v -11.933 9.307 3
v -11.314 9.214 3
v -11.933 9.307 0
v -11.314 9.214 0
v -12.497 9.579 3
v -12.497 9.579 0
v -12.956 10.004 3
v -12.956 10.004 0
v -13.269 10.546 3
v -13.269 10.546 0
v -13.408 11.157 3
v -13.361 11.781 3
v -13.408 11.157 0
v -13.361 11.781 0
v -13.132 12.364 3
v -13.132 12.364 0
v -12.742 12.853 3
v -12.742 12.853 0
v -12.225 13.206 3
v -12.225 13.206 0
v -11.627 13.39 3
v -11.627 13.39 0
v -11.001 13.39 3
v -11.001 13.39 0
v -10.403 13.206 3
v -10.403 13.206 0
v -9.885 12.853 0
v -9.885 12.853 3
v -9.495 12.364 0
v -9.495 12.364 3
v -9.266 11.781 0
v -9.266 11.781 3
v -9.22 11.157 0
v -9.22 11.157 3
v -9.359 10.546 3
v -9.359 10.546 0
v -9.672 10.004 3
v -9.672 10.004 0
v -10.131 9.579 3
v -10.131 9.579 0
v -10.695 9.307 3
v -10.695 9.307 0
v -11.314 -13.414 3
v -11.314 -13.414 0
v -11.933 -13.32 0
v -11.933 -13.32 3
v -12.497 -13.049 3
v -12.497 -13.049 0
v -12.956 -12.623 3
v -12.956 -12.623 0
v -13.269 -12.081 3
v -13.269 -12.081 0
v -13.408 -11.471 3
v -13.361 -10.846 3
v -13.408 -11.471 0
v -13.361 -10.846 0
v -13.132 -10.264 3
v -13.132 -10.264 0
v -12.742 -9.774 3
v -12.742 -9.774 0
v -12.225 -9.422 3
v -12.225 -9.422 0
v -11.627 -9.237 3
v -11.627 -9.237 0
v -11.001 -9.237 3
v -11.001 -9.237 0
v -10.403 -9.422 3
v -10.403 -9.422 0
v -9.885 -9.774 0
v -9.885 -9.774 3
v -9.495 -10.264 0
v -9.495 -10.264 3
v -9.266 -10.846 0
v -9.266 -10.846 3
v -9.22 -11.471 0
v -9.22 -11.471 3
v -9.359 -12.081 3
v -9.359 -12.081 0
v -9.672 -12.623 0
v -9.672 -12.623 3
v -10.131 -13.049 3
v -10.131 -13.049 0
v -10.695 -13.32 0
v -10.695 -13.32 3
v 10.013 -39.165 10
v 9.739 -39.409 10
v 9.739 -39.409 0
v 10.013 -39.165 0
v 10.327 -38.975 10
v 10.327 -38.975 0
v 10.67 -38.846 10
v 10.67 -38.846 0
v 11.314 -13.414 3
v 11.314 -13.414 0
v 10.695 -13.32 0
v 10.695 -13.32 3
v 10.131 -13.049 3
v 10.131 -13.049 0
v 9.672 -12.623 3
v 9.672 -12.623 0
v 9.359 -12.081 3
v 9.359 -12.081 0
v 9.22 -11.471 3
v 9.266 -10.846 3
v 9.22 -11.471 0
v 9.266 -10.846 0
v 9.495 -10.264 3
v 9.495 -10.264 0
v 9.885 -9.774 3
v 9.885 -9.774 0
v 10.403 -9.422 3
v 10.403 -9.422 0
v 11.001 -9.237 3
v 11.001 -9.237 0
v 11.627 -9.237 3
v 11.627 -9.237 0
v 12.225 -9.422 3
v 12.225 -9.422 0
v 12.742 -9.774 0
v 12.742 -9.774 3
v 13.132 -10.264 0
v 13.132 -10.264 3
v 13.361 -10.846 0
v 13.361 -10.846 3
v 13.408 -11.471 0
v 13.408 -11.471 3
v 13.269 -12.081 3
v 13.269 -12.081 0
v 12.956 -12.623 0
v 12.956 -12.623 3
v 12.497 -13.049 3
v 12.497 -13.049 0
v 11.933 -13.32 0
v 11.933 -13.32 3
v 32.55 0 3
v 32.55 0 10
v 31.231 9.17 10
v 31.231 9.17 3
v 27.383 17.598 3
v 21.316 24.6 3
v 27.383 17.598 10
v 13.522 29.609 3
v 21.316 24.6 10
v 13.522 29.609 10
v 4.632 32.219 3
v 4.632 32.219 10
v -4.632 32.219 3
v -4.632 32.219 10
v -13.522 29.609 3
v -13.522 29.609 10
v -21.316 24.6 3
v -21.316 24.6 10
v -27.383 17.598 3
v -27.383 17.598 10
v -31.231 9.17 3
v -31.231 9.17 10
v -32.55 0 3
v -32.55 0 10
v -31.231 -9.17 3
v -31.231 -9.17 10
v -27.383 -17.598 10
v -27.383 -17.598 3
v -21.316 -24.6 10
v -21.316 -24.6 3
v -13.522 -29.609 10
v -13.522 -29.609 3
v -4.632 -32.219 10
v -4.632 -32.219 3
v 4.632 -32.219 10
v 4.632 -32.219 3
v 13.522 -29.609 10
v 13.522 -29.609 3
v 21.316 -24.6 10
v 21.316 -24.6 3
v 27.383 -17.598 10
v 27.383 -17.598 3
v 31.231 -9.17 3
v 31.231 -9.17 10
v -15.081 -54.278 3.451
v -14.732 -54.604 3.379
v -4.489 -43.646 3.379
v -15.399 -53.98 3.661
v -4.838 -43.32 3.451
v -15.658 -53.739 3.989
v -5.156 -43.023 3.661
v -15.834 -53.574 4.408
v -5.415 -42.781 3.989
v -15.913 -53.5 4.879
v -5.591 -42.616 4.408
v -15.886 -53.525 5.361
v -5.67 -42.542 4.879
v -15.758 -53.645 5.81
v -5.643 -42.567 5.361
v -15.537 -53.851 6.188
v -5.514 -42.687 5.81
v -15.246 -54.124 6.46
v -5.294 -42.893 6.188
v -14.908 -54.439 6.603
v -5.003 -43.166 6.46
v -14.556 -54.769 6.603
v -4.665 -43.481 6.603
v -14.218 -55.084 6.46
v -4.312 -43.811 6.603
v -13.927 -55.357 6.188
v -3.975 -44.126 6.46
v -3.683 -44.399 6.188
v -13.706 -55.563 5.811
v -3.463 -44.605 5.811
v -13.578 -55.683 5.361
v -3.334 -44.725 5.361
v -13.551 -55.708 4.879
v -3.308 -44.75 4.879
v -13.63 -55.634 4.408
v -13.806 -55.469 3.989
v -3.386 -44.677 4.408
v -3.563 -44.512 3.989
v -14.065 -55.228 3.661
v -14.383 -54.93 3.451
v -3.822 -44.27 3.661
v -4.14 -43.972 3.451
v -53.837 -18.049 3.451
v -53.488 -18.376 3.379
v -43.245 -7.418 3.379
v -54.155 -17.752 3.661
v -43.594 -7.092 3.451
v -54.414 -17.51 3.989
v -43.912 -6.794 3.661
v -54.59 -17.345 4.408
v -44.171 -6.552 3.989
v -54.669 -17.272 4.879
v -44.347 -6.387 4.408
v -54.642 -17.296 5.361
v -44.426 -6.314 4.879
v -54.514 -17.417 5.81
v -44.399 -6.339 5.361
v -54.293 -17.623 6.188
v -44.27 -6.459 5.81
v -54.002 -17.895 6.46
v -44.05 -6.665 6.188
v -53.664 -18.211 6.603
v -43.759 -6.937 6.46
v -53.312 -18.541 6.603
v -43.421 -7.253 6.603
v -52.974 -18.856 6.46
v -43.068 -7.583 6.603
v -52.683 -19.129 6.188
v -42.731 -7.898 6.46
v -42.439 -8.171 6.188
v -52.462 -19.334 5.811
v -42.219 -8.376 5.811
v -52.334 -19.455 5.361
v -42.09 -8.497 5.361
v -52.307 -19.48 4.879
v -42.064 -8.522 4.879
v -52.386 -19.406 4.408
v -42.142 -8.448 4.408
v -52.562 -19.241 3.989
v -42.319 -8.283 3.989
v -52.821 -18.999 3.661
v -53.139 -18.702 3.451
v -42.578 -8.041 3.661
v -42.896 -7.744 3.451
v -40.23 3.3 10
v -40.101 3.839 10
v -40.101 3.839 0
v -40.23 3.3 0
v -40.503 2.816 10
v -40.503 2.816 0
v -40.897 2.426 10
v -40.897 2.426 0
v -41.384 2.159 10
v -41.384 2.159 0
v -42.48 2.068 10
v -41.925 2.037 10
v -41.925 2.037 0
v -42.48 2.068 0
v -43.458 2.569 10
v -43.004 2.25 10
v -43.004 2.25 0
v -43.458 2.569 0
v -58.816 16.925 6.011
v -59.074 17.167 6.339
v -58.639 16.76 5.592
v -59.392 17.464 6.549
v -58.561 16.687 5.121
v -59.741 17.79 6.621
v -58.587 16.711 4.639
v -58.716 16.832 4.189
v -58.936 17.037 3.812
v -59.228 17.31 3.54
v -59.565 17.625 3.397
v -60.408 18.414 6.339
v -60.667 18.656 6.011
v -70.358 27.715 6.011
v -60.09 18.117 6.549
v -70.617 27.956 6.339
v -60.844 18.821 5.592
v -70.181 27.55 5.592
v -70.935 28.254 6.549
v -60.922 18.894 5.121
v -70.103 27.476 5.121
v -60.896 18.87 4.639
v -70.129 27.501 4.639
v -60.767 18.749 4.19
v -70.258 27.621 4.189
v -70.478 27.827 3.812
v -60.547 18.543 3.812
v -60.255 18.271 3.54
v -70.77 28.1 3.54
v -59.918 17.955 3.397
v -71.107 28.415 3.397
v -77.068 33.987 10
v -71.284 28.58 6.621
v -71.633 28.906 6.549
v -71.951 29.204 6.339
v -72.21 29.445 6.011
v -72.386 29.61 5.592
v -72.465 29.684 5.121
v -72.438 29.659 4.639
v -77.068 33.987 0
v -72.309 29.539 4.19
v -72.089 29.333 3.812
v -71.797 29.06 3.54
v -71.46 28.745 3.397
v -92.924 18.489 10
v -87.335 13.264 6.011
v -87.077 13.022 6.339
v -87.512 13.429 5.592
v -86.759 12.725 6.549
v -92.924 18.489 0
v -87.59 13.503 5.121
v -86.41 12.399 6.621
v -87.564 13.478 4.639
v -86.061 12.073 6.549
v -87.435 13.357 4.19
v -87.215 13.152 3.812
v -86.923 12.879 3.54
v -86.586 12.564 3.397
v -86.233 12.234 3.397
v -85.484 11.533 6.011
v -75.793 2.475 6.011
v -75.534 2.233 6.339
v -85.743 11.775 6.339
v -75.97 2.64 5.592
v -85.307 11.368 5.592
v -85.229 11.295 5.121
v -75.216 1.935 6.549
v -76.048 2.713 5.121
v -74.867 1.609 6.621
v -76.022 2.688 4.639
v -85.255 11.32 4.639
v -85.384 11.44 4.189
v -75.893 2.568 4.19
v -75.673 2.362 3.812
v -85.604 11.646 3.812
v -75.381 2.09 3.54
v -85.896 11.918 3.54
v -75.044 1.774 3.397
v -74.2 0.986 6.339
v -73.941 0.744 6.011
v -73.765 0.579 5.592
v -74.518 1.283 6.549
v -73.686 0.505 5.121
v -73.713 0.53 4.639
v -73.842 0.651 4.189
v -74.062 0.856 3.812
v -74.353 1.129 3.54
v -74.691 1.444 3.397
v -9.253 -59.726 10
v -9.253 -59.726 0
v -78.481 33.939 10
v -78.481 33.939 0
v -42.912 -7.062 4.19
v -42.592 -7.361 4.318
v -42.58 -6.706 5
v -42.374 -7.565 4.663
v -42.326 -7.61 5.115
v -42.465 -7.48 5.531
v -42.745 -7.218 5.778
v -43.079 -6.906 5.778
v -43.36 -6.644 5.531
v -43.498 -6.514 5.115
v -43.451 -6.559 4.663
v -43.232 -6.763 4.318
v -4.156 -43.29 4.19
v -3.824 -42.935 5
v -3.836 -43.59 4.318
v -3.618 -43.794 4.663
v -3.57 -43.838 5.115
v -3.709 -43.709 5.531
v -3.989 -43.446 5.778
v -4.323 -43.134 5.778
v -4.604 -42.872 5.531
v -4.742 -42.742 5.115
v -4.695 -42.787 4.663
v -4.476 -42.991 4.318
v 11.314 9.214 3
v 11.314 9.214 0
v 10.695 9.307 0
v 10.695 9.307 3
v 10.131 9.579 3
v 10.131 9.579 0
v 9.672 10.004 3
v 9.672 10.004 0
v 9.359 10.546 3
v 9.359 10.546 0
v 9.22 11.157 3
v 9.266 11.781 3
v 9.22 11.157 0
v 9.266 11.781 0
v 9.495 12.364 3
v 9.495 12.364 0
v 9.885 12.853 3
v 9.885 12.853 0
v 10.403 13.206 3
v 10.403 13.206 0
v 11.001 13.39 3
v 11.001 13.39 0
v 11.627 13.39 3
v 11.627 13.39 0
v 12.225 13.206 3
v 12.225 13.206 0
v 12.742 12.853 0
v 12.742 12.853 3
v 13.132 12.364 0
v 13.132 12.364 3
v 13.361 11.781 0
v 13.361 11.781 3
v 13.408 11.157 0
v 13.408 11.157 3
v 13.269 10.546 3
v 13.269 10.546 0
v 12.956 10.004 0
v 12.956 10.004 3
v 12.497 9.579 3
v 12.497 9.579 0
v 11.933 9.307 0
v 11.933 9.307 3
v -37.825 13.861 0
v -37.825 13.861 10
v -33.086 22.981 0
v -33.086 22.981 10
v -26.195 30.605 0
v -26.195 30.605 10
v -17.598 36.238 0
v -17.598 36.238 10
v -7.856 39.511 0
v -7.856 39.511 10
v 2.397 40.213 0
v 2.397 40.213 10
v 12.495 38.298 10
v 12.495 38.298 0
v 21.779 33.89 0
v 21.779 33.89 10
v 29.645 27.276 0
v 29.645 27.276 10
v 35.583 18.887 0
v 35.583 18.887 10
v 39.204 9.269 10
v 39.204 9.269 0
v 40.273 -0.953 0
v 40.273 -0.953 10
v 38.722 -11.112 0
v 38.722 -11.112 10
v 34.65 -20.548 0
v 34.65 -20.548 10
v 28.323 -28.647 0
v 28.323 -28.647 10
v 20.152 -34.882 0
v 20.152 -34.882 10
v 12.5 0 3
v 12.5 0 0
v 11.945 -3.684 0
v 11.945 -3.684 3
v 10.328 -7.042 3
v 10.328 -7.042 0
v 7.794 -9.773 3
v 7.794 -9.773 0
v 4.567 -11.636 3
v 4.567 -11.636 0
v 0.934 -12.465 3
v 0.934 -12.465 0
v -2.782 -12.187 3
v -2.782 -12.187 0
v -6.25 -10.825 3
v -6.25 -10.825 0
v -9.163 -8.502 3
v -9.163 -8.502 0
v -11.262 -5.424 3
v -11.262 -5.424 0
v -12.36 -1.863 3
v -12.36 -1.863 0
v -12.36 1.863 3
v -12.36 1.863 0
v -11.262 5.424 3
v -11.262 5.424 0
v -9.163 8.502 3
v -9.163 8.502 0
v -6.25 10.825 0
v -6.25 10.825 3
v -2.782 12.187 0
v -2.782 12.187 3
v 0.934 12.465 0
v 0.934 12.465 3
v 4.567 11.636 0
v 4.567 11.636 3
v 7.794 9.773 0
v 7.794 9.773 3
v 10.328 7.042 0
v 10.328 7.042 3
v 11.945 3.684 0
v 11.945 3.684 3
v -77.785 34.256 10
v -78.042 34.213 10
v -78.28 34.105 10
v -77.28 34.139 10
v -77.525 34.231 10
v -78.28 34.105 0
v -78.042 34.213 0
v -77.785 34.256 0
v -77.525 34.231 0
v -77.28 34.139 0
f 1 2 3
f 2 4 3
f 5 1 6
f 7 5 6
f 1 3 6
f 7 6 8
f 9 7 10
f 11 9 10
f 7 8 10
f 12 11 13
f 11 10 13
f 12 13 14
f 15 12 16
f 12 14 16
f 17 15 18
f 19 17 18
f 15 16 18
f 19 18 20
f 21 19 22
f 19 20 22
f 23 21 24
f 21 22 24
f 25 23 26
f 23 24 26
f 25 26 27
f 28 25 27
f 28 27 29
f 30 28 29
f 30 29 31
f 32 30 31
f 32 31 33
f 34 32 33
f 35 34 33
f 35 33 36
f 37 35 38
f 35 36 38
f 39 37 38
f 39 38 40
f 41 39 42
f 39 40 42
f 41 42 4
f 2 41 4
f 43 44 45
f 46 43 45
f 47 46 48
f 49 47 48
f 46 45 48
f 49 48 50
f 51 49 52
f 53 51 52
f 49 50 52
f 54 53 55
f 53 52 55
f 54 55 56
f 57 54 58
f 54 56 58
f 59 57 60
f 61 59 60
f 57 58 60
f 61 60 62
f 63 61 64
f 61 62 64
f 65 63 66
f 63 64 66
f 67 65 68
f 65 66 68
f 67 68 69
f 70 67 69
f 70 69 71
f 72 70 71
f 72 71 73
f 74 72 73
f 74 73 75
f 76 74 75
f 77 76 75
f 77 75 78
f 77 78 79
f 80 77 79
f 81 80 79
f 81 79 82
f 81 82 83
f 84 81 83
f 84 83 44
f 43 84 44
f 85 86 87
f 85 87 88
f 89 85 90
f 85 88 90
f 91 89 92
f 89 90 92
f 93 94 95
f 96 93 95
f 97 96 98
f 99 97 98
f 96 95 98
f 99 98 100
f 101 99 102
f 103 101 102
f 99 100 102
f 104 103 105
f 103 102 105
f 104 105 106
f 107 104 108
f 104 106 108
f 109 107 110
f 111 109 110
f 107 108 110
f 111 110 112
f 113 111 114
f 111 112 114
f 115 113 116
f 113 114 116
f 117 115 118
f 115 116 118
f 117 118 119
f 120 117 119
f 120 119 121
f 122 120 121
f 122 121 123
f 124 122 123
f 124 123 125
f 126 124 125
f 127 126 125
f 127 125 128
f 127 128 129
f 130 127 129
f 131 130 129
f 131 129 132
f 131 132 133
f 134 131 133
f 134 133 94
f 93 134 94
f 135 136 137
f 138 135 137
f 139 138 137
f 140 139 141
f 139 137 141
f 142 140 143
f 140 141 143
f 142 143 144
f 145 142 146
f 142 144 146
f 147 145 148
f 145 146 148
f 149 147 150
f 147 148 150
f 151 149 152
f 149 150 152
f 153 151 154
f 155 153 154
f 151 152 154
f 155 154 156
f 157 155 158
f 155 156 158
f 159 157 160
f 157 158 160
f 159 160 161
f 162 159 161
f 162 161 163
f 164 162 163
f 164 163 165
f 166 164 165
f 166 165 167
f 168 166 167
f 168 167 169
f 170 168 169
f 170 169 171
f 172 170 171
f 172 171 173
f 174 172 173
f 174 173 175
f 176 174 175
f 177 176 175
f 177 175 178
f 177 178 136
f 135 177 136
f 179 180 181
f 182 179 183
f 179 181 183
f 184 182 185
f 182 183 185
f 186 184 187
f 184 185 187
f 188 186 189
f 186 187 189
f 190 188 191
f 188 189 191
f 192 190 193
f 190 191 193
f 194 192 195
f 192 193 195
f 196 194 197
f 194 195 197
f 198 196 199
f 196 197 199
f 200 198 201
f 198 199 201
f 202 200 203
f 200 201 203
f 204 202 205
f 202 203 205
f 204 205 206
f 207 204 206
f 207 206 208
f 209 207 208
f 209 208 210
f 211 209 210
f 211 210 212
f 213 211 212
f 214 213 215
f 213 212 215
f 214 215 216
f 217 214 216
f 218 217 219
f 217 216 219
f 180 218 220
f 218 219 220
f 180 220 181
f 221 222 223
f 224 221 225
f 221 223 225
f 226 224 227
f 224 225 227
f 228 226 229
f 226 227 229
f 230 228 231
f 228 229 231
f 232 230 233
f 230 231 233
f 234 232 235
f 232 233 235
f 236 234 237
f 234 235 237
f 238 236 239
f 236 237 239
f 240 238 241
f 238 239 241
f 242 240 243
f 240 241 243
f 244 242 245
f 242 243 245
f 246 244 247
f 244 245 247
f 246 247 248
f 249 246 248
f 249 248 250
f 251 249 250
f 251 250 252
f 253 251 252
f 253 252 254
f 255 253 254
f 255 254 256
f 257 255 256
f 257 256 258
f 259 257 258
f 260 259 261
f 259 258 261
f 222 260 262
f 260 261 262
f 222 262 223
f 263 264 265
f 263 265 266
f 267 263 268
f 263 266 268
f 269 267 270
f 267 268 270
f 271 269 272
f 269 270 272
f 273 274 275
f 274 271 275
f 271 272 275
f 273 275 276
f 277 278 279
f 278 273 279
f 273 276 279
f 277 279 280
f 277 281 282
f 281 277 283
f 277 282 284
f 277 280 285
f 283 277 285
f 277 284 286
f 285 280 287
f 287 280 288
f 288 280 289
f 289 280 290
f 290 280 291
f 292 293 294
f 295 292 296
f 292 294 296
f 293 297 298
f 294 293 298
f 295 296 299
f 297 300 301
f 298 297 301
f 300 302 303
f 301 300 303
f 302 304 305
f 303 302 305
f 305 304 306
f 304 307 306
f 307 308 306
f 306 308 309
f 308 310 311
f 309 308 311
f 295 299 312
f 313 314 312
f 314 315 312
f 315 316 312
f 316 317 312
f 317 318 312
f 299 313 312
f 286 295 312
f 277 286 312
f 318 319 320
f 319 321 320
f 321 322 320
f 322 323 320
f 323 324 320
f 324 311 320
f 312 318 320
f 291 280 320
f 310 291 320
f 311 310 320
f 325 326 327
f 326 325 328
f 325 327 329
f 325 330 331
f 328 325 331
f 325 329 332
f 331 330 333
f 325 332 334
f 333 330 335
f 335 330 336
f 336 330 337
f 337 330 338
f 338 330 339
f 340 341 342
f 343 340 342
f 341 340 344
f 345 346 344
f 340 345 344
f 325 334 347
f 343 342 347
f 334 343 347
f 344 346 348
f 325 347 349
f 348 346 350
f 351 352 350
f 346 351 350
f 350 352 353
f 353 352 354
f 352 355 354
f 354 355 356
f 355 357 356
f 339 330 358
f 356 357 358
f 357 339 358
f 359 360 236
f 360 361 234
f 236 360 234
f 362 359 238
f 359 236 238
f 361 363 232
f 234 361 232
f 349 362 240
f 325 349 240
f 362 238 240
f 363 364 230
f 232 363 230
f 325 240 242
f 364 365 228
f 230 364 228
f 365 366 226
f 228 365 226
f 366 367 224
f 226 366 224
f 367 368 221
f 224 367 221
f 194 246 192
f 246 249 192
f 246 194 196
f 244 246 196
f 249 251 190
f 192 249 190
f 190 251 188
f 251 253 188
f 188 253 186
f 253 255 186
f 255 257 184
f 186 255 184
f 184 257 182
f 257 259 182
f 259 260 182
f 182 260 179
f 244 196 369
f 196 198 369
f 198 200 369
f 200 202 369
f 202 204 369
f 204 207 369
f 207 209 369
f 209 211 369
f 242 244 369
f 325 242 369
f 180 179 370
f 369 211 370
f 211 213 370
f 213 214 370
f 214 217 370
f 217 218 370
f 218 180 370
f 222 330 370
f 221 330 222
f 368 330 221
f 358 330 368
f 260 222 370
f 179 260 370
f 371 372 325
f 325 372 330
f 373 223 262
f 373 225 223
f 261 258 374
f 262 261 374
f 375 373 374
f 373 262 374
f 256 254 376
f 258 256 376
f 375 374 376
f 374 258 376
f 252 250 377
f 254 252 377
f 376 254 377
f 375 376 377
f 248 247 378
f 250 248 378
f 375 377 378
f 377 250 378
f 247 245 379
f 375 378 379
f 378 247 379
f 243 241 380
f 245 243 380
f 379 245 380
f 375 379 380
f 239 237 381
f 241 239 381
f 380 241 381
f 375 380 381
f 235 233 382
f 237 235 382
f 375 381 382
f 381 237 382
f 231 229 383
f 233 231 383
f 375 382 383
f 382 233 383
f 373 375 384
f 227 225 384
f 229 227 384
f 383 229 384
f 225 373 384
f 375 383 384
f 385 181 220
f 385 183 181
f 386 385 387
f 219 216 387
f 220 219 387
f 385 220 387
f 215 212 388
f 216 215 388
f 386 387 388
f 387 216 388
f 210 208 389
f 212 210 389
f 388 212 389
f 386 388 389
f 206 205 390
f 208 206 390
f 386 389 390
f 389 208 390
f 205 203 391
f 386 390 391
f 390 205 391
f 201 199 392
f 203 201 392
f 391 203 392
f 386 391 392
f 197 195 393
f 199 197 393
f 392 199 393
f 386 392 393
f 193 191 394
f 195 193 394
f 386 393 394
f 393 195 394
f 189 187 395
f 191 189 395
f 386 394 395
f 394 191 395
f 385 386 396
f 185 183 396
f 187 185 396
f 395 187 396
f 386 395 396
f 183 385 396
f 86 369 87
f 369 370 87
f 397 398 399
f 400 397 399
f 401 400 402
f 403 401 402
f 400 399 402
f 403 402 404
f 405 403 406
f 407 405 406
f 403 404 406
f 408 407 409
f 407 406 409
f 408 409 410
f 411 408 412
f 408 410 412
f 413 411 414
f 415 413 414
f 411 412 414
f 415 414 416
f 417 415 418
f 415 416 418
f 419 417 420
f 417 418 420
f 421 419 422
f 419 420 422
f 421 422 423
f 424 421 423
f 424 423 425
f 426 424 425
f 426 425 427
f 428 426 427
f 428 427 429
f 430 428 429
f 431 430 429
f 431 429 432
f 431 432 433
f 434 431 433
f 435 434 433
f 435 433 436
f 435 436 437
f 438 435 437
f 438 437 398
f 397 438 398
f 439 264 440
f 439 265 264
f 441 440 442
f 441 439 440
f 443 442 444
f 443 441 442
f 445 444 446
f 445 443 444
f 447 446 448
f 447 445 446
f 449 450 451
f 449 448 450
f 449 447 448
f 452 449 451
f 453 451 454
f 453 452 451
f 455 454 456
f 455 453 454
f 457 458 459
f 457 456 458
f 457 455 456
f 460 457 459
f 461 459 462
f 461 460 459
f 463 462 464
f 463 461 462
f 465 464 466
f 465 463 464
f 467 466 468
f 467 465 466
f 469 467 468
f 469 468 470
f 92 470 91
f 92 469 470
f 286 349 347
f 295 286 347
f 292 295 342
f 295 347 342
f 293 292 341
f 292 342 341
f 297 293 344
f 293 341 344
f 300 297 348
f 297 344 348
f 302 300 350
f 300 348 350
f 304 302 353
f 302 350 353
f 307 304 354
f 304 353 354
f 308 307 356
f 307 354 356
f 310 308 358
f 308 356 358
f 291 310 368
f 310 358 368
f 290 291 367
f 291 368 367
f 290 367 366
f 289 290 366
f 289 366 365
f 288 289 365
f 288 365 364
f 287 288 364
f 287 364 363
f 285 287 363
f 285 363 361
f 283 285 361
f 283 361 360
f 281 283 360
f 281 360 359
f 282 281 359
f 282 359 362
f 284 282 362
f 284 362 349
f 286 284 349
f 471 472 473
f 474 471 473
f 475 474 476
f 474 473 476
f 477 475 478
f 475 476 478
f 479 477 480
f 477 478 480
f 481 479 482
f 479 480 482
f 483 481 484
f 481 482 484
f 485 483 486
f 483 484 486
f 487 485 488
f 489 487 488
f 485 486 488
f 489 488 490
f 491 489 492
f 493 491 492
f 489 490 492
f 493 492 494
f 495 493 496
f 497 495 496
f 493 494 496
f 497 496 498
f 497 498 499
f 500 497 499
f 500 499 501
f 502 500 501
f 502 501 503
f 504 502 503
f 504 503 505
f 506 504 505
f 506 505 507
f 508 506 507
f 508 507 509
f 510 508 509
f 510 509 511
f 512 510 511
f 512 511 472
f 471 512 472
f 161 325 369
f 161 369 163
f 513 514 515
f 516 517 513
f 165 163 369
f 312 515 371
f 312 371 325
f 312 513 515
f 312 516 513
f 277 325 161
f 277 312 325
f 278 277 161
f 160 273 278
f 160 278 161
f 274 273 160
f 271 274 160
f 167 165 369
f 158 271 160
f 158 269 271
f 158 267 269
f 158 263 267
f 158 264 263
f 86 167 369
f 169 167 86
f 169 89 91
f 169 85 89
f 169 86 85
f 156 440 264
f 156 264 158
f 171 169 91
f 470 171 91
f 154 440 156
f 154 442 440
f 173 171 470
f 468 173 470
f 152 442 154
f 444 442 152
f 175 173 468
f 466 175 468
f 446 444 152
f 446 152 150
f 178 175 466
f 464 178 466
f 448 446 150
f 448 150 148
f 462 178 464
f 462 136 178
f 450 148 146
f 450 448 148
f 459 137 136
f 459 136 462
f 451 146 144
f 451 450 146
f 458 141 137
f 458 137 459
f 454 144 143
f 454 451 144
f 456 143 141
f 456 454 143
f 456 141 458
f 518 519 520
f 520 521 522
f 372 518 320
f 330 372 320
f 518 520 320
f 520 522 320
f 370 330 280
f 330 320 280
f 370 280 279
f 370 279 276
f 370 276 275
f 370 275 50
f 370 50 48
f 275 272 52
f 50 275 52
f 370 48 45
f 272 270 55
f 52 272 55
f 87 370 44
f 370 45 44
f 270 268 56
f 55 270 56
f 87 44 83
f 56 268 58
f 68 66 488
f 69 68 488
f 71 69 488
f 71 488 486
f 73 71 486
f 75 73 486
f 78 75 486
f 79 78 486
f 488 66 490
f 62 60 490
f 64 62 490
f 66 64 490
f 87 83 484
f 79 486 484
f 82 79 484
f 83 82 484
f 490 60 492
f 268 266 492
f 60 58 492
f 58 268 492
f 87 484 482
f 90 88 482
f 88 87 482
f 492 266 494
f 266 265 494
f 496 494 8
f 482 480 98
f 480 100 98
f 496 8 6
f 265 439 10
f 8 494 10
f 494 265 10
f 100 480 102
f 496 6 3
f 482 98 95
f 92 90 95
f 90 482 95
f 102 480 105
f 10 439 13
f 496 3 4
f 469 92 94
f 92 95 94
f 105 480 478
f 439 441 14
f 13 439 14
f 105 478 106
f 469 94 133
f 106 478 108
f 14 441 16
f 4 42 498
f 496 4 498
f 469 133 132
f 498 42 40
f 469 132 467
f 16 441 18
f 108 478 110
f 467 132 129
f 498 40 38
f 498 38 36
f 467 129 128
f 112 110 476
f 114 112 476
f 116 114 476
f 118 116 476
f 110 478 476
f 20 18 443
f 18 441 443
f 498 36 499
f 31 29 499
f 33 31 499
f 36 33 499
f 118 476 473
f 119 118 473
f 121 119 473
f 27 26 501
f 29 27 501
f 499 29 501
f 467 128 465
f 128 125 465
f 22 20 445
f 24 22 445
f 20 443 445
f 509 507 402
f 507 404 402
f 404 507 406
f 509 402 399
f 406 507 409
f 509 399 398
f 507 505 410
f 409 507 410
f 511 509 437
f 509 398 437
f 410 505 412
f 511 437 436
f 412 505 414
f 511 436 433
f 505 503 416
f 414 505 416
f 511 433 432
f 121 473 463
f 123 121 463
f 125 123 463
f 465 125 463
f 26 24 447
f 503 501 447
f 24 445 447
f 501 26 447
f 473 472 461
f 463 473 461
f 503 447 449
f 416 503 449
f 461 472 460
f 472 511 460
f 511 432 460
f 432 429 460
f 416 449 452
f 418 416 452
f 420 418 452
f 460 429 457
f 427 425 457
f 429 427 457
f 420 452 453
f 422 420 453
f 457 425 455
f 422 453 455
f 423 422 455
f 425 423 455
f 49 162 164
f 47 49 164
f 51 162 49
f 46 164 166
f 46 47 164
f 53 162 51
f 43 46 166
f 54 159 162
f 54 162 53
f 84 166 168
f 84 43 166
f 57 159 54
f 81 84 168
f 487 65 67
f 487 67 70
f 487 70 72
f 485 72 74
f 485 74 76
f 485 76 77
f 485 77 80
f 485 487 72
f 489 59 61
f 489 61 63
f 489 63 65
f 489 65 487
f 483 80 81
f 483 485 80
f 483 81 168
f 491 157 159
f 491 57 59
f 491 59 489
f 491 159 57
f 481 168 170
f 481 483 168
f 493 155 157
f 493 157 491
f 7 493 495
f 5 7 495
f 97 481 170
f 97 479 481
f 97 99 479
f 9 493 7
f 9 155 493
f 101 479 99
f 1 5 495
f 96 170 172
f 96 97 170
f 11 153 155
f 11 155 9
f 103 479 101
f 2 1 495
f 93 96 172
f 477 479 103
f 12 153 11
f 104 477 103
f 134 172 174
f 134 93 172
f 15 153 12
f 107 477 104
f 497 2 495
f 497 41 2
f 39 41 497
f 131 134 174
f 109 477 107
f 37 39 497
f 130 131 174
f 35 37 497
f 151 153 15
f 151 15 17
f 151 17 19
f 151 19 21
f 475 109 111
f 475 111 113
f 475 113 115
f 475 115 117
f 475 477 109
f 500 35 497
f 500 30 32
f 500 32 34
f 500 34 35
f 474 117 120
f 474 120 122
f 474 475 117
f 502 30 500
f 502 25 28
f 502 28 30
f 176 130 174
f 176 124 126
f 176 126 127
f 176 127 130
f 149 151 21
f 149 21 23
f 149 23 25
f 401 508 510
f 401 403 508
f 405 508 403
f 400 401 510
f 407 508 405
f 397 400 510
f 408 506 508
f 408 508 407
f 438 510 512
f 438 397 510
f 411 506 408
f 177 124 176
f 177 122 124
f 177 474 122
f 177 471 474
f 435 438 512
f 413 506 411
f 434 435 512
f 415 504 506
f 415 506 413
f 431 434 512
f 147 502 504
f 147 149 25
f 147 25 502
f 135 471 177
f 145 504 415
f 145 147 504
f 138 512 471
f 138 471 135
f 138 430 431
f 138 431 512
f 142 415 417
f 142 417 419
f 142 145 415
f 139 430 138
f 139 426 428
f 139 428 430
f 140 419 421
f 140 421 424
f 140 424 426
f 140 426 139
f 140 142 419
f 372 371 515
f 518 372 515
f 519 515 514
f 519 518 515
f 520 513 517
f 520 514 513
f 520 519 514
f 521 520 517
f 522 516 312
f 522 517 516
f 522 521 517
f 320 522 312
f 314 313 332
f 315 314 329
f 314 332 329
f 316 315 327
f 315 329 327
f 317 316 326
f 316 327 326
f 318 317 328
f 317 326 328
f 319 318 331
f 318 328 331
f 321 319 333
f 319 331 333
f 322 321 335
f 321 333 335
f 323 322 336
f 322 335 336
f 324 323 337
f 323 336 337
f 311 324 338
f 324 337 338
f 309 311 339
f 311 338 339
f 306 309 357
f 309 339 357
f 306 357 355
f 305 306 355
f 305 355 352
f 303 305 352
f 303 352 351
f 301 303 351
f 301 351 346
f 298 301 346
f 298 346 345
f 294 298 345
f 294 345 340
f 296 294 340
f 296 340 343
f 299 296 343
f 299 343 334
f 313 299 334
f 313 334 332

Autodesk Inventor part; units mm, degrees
ref_plane "YZ Plane" through (0, 0, 0) normal (1, 0, 0) x (0, 1, 0)
ref_plane "XZ Plane" through (0, 0, 0) normal (0, 1, 0) x (-1, 0, 0)
ref_plane "Work Plane1" through (0, 0, 0) normal (0, 0, 1) x (1, 0, 0)
sketch "Sketch1" plane through (0, 0, 0) normal (0, 0, 1) x (1, 0, 0)
  arc A0 (-77.068, 33.987) -> (-78.4814, 33.9394) centre (-77.7509, 33.2565) ccw projected
  line L0 (-78.4814, 33.9394) -> (-92.9244, 18.4887) projected
  line L1 (-92.9244, 18.4887) -> (-9.2531, -59.7257) projected
  line L2 (-9.2531, -59.7257) -> (9.7389, -39.4086) projected
  arc A1 (10.6702, -38.8458) -> (9.7389, -39.4086) centre (11.2, -40.7744) ccw projected
  arc A2 (10.6702, -38.8458) -> (-40.1013, 3.8394) centre (0, 0) ccw projected
  line L3 (-43.4579, 2.5689) -> (-77.068, 33.987) projected
  circle A3 centre (33.3141, 1.123) radius 2.5 projected
  circle A4 centre (1.123, -33.3141) radius 2.5 projected
  circle A5 centre (0, 0) radius 21 projected
  circle A6 centre (-1.123, 33.3141) radius 2.5 projected
  circle A7 centre (-33.3141, -1.123) radius 2.5 projected
  circle A8 centre (0, 0) radius 12.5 projected
  circle A9 centre (0, -16) radius 2 projected
  circle A10 centre (0, 16) radius 2 projected
  circle A11 centre (-16, 0) radius 2 projected
  circle A12 centre (16, 0) radius 2 projected
  circle A13 centre (11.3137, 11.3137) radius 1.6 projected
  circle A14 centre (-11.3137, -11.3137) radius 1.6 projected
  circle A15 centre (-11.3137, 11.3137) radius 1.6 projected
  circle A16 centre (11.3137, -11.3137) radius 1.6 projected
  circle A17 centre (0, 0) radius 20.7 projected
  circle A18 centre (0, 0) radius 40.2846
  line L4 (31.6375, -97.9493) -> (-99.8575, 24.9697) projected
  arc A19 (-43.4579, 2.5689) -> (-40.1013, 3.8394) centre (-42.0921, 4.03) ccw projected
  point P0 (0, 0)
  point P1 (-45.0314, -26.2807)
  point P2 (-23.1886, -46.699)
  point P3 (0, 0)
  point P4 (10.6702, -38.8458)
  point P5 (-40.1013, 3.8394)
  point P6 (0, 0)
extrude "Extrusion1" add sketch "Sketch1" along normal blind 10 contours L3 A19 A18 A1 L2 L1 L0 A0 | A2 A18 | A3 | A4 | A5 | A6 | A7 | A9 | A10 | A11 | A12 | A13 | A14 | A15 | A16 | A17
sketch "Sketch2" plane through (-77.068, 33.987, 10) normal (0.6828833, 0.7305275, 0) x (0.7305275, -0.6828833, 0)
  arc A0 (36.818, 70.5) -> (34.818, 72.5) centre (34.818, 70.5) ccw projected
  line L0 (-3.182, 72.5) -> (34.818, 72.5) projected
  arc A1 (-3.182, 72.5) -> (-5.182, 70.5) centre (-3.182, 70.5) ccw projected
  line L1 (-5.182, 2) -> (-5.182, 70.5) projected
  arc A2 (-5.182, 2) -> (-3.182, 0) centre (-3.182, 2) ccw projected
  line L2 (34.818, 0) -> (-3.182, 0) projected
  arc A3 (34.818, 0) -> (36.818, 2) centre (34.818, 2) ccw projected
  line L3 (36.818, 70.5) -> (36.818, 2) projected
  circle A4 centre (15.818, 36.25) radius 12.6 projected
  circle A5 centre (31.818, 36.25) radius 2 projected
  arc A6 (31.218, 2.9) -> (31.218, 7.1) centre (31.218, 5) ccw projected
  line L4 (0.418, 2.9) -> (31.218, 2.9) projected
  arc A7 (0.418, 7.1) -> (0.418, 2.9) centre (0.418, 5) ccw projected
  line L5 (31.218, 7.1) -> (0.418, 7.1) projected
  circle A8 centre (15.818, 20.25) radius 2 projected
  arc A9 (0.418, 69.6) -> (0.418, 65.4) centre (0.418, 67.5) ccw projected
  line L6 (31.218, 69.6) -> (0.418, 69.6) projected
  arc A10 (31.218, 65.4) -> (31.218, 69.6) centre (31.218, 67.5) ccw projected
  line L7 (0.418, 65.4) -> (31.218, 65.4) projected
  circle A11 centre (15.818, 52.25) radius 2 projected
  circle A12 centre (-0.182, 36.25) radius 2 projected
  circle A13 centre (7.918, 67.5) radius 1.5706 projected
  circle A14 centre (23.718, 67.5) radius 1.5706 projected
  circle A15 centre (28.5459, 23.5221) radius 2 projected
  circle A16 centre (3.09, 23.5221) radius 2 projected
  circle A17 centre (3.09, 48.9779) radius 2 projected
  circle A18 centre (28.5459, 48.9779) radius 2 projected
  point P0 (79.5095, 10)
  point P1 (7.918, 5)
  point P2 (23.718, 5)
hole "Hole1" at (-71.2837, 28.58, 5) at (-59.7414, 17.7904, 5) direction (-0.6828833, -0.7305275, 0) diameter 3.242 end through all thread size "M4x0.7" class "6H" standard "ISO Metric profile"
sketch "Sketch9" plane through (0, 0, 10) normal (0, 0, 1) x (1, 0, 0)
  circle A0 centre (0, 0) radius 32.55
  dimension "d44" = 65.1
extrude "Extrusion4" cut sketch "Sketch9" against normal blind 7
sketch "Sketch11" plane through (-9.2531, -59.7257, 0) normal (-0.6828833, -0.7305275, 0) x (0.7305275, -0.6828833, 0)
  circle A0 centre (-60.5521, 5) radius 2.25 projected
  circle A1 centre (-7.5, 5) radius 2.25 projected
  point P0 (-34.026, 0)
hole "Hole7" at (-53.488, -18.3757, 5) at (-14.732, -54.604, 5) direction (0.6828833, 0.7305275, 0) diameter 3.242 depth 15 tip angle 118 thread size "M4x0.7" class "6H" standard "ISO Metric profile"
sketch "Sketch12" plane through (0, 0, 3) normal (0, 0, 1) x (1, 0, 0)
  circle A0 centre (0, 0) radius 12.5 projected
  circle A1 centre (0, -18) radius 2 projected
  circle A2 centre (0, 18) radius 2 projected
  circle A3 centre (-18, 0) radius 2 projected
  circle A4 centre (18, 0) radius 2 projected
  circle A5 centre (11.3137, 11.3137) radius 1.6 projected
  circle A6 centre (-11.3137, -11.3137) radius 1.6 projected
  circle A7 centre (-11.3137, 11.3137) radius 1.6 projected
  circle A8 centre (11.3137, -11.3137) radius 1.6 projected
  circle A9 centre (0, 0) radius 20.7 projected
  point P0 (0, 0)
hole "Hole8" at (11.3137, 11.3137, 3) at (-11.3137, 11.3137, 3) at (-11.3137, -11.3137, 3) at (11.3137, -11.3137, 3) direction (0, 0, -1) diameter 4.2 depth 12.8 tip angle 118 clearance for "Countersunk Flat Head Screw ISO 2009/7046" size "M4" standard "ISO"
properties part number "gearboxframv2" material "Aluminum 6061"
